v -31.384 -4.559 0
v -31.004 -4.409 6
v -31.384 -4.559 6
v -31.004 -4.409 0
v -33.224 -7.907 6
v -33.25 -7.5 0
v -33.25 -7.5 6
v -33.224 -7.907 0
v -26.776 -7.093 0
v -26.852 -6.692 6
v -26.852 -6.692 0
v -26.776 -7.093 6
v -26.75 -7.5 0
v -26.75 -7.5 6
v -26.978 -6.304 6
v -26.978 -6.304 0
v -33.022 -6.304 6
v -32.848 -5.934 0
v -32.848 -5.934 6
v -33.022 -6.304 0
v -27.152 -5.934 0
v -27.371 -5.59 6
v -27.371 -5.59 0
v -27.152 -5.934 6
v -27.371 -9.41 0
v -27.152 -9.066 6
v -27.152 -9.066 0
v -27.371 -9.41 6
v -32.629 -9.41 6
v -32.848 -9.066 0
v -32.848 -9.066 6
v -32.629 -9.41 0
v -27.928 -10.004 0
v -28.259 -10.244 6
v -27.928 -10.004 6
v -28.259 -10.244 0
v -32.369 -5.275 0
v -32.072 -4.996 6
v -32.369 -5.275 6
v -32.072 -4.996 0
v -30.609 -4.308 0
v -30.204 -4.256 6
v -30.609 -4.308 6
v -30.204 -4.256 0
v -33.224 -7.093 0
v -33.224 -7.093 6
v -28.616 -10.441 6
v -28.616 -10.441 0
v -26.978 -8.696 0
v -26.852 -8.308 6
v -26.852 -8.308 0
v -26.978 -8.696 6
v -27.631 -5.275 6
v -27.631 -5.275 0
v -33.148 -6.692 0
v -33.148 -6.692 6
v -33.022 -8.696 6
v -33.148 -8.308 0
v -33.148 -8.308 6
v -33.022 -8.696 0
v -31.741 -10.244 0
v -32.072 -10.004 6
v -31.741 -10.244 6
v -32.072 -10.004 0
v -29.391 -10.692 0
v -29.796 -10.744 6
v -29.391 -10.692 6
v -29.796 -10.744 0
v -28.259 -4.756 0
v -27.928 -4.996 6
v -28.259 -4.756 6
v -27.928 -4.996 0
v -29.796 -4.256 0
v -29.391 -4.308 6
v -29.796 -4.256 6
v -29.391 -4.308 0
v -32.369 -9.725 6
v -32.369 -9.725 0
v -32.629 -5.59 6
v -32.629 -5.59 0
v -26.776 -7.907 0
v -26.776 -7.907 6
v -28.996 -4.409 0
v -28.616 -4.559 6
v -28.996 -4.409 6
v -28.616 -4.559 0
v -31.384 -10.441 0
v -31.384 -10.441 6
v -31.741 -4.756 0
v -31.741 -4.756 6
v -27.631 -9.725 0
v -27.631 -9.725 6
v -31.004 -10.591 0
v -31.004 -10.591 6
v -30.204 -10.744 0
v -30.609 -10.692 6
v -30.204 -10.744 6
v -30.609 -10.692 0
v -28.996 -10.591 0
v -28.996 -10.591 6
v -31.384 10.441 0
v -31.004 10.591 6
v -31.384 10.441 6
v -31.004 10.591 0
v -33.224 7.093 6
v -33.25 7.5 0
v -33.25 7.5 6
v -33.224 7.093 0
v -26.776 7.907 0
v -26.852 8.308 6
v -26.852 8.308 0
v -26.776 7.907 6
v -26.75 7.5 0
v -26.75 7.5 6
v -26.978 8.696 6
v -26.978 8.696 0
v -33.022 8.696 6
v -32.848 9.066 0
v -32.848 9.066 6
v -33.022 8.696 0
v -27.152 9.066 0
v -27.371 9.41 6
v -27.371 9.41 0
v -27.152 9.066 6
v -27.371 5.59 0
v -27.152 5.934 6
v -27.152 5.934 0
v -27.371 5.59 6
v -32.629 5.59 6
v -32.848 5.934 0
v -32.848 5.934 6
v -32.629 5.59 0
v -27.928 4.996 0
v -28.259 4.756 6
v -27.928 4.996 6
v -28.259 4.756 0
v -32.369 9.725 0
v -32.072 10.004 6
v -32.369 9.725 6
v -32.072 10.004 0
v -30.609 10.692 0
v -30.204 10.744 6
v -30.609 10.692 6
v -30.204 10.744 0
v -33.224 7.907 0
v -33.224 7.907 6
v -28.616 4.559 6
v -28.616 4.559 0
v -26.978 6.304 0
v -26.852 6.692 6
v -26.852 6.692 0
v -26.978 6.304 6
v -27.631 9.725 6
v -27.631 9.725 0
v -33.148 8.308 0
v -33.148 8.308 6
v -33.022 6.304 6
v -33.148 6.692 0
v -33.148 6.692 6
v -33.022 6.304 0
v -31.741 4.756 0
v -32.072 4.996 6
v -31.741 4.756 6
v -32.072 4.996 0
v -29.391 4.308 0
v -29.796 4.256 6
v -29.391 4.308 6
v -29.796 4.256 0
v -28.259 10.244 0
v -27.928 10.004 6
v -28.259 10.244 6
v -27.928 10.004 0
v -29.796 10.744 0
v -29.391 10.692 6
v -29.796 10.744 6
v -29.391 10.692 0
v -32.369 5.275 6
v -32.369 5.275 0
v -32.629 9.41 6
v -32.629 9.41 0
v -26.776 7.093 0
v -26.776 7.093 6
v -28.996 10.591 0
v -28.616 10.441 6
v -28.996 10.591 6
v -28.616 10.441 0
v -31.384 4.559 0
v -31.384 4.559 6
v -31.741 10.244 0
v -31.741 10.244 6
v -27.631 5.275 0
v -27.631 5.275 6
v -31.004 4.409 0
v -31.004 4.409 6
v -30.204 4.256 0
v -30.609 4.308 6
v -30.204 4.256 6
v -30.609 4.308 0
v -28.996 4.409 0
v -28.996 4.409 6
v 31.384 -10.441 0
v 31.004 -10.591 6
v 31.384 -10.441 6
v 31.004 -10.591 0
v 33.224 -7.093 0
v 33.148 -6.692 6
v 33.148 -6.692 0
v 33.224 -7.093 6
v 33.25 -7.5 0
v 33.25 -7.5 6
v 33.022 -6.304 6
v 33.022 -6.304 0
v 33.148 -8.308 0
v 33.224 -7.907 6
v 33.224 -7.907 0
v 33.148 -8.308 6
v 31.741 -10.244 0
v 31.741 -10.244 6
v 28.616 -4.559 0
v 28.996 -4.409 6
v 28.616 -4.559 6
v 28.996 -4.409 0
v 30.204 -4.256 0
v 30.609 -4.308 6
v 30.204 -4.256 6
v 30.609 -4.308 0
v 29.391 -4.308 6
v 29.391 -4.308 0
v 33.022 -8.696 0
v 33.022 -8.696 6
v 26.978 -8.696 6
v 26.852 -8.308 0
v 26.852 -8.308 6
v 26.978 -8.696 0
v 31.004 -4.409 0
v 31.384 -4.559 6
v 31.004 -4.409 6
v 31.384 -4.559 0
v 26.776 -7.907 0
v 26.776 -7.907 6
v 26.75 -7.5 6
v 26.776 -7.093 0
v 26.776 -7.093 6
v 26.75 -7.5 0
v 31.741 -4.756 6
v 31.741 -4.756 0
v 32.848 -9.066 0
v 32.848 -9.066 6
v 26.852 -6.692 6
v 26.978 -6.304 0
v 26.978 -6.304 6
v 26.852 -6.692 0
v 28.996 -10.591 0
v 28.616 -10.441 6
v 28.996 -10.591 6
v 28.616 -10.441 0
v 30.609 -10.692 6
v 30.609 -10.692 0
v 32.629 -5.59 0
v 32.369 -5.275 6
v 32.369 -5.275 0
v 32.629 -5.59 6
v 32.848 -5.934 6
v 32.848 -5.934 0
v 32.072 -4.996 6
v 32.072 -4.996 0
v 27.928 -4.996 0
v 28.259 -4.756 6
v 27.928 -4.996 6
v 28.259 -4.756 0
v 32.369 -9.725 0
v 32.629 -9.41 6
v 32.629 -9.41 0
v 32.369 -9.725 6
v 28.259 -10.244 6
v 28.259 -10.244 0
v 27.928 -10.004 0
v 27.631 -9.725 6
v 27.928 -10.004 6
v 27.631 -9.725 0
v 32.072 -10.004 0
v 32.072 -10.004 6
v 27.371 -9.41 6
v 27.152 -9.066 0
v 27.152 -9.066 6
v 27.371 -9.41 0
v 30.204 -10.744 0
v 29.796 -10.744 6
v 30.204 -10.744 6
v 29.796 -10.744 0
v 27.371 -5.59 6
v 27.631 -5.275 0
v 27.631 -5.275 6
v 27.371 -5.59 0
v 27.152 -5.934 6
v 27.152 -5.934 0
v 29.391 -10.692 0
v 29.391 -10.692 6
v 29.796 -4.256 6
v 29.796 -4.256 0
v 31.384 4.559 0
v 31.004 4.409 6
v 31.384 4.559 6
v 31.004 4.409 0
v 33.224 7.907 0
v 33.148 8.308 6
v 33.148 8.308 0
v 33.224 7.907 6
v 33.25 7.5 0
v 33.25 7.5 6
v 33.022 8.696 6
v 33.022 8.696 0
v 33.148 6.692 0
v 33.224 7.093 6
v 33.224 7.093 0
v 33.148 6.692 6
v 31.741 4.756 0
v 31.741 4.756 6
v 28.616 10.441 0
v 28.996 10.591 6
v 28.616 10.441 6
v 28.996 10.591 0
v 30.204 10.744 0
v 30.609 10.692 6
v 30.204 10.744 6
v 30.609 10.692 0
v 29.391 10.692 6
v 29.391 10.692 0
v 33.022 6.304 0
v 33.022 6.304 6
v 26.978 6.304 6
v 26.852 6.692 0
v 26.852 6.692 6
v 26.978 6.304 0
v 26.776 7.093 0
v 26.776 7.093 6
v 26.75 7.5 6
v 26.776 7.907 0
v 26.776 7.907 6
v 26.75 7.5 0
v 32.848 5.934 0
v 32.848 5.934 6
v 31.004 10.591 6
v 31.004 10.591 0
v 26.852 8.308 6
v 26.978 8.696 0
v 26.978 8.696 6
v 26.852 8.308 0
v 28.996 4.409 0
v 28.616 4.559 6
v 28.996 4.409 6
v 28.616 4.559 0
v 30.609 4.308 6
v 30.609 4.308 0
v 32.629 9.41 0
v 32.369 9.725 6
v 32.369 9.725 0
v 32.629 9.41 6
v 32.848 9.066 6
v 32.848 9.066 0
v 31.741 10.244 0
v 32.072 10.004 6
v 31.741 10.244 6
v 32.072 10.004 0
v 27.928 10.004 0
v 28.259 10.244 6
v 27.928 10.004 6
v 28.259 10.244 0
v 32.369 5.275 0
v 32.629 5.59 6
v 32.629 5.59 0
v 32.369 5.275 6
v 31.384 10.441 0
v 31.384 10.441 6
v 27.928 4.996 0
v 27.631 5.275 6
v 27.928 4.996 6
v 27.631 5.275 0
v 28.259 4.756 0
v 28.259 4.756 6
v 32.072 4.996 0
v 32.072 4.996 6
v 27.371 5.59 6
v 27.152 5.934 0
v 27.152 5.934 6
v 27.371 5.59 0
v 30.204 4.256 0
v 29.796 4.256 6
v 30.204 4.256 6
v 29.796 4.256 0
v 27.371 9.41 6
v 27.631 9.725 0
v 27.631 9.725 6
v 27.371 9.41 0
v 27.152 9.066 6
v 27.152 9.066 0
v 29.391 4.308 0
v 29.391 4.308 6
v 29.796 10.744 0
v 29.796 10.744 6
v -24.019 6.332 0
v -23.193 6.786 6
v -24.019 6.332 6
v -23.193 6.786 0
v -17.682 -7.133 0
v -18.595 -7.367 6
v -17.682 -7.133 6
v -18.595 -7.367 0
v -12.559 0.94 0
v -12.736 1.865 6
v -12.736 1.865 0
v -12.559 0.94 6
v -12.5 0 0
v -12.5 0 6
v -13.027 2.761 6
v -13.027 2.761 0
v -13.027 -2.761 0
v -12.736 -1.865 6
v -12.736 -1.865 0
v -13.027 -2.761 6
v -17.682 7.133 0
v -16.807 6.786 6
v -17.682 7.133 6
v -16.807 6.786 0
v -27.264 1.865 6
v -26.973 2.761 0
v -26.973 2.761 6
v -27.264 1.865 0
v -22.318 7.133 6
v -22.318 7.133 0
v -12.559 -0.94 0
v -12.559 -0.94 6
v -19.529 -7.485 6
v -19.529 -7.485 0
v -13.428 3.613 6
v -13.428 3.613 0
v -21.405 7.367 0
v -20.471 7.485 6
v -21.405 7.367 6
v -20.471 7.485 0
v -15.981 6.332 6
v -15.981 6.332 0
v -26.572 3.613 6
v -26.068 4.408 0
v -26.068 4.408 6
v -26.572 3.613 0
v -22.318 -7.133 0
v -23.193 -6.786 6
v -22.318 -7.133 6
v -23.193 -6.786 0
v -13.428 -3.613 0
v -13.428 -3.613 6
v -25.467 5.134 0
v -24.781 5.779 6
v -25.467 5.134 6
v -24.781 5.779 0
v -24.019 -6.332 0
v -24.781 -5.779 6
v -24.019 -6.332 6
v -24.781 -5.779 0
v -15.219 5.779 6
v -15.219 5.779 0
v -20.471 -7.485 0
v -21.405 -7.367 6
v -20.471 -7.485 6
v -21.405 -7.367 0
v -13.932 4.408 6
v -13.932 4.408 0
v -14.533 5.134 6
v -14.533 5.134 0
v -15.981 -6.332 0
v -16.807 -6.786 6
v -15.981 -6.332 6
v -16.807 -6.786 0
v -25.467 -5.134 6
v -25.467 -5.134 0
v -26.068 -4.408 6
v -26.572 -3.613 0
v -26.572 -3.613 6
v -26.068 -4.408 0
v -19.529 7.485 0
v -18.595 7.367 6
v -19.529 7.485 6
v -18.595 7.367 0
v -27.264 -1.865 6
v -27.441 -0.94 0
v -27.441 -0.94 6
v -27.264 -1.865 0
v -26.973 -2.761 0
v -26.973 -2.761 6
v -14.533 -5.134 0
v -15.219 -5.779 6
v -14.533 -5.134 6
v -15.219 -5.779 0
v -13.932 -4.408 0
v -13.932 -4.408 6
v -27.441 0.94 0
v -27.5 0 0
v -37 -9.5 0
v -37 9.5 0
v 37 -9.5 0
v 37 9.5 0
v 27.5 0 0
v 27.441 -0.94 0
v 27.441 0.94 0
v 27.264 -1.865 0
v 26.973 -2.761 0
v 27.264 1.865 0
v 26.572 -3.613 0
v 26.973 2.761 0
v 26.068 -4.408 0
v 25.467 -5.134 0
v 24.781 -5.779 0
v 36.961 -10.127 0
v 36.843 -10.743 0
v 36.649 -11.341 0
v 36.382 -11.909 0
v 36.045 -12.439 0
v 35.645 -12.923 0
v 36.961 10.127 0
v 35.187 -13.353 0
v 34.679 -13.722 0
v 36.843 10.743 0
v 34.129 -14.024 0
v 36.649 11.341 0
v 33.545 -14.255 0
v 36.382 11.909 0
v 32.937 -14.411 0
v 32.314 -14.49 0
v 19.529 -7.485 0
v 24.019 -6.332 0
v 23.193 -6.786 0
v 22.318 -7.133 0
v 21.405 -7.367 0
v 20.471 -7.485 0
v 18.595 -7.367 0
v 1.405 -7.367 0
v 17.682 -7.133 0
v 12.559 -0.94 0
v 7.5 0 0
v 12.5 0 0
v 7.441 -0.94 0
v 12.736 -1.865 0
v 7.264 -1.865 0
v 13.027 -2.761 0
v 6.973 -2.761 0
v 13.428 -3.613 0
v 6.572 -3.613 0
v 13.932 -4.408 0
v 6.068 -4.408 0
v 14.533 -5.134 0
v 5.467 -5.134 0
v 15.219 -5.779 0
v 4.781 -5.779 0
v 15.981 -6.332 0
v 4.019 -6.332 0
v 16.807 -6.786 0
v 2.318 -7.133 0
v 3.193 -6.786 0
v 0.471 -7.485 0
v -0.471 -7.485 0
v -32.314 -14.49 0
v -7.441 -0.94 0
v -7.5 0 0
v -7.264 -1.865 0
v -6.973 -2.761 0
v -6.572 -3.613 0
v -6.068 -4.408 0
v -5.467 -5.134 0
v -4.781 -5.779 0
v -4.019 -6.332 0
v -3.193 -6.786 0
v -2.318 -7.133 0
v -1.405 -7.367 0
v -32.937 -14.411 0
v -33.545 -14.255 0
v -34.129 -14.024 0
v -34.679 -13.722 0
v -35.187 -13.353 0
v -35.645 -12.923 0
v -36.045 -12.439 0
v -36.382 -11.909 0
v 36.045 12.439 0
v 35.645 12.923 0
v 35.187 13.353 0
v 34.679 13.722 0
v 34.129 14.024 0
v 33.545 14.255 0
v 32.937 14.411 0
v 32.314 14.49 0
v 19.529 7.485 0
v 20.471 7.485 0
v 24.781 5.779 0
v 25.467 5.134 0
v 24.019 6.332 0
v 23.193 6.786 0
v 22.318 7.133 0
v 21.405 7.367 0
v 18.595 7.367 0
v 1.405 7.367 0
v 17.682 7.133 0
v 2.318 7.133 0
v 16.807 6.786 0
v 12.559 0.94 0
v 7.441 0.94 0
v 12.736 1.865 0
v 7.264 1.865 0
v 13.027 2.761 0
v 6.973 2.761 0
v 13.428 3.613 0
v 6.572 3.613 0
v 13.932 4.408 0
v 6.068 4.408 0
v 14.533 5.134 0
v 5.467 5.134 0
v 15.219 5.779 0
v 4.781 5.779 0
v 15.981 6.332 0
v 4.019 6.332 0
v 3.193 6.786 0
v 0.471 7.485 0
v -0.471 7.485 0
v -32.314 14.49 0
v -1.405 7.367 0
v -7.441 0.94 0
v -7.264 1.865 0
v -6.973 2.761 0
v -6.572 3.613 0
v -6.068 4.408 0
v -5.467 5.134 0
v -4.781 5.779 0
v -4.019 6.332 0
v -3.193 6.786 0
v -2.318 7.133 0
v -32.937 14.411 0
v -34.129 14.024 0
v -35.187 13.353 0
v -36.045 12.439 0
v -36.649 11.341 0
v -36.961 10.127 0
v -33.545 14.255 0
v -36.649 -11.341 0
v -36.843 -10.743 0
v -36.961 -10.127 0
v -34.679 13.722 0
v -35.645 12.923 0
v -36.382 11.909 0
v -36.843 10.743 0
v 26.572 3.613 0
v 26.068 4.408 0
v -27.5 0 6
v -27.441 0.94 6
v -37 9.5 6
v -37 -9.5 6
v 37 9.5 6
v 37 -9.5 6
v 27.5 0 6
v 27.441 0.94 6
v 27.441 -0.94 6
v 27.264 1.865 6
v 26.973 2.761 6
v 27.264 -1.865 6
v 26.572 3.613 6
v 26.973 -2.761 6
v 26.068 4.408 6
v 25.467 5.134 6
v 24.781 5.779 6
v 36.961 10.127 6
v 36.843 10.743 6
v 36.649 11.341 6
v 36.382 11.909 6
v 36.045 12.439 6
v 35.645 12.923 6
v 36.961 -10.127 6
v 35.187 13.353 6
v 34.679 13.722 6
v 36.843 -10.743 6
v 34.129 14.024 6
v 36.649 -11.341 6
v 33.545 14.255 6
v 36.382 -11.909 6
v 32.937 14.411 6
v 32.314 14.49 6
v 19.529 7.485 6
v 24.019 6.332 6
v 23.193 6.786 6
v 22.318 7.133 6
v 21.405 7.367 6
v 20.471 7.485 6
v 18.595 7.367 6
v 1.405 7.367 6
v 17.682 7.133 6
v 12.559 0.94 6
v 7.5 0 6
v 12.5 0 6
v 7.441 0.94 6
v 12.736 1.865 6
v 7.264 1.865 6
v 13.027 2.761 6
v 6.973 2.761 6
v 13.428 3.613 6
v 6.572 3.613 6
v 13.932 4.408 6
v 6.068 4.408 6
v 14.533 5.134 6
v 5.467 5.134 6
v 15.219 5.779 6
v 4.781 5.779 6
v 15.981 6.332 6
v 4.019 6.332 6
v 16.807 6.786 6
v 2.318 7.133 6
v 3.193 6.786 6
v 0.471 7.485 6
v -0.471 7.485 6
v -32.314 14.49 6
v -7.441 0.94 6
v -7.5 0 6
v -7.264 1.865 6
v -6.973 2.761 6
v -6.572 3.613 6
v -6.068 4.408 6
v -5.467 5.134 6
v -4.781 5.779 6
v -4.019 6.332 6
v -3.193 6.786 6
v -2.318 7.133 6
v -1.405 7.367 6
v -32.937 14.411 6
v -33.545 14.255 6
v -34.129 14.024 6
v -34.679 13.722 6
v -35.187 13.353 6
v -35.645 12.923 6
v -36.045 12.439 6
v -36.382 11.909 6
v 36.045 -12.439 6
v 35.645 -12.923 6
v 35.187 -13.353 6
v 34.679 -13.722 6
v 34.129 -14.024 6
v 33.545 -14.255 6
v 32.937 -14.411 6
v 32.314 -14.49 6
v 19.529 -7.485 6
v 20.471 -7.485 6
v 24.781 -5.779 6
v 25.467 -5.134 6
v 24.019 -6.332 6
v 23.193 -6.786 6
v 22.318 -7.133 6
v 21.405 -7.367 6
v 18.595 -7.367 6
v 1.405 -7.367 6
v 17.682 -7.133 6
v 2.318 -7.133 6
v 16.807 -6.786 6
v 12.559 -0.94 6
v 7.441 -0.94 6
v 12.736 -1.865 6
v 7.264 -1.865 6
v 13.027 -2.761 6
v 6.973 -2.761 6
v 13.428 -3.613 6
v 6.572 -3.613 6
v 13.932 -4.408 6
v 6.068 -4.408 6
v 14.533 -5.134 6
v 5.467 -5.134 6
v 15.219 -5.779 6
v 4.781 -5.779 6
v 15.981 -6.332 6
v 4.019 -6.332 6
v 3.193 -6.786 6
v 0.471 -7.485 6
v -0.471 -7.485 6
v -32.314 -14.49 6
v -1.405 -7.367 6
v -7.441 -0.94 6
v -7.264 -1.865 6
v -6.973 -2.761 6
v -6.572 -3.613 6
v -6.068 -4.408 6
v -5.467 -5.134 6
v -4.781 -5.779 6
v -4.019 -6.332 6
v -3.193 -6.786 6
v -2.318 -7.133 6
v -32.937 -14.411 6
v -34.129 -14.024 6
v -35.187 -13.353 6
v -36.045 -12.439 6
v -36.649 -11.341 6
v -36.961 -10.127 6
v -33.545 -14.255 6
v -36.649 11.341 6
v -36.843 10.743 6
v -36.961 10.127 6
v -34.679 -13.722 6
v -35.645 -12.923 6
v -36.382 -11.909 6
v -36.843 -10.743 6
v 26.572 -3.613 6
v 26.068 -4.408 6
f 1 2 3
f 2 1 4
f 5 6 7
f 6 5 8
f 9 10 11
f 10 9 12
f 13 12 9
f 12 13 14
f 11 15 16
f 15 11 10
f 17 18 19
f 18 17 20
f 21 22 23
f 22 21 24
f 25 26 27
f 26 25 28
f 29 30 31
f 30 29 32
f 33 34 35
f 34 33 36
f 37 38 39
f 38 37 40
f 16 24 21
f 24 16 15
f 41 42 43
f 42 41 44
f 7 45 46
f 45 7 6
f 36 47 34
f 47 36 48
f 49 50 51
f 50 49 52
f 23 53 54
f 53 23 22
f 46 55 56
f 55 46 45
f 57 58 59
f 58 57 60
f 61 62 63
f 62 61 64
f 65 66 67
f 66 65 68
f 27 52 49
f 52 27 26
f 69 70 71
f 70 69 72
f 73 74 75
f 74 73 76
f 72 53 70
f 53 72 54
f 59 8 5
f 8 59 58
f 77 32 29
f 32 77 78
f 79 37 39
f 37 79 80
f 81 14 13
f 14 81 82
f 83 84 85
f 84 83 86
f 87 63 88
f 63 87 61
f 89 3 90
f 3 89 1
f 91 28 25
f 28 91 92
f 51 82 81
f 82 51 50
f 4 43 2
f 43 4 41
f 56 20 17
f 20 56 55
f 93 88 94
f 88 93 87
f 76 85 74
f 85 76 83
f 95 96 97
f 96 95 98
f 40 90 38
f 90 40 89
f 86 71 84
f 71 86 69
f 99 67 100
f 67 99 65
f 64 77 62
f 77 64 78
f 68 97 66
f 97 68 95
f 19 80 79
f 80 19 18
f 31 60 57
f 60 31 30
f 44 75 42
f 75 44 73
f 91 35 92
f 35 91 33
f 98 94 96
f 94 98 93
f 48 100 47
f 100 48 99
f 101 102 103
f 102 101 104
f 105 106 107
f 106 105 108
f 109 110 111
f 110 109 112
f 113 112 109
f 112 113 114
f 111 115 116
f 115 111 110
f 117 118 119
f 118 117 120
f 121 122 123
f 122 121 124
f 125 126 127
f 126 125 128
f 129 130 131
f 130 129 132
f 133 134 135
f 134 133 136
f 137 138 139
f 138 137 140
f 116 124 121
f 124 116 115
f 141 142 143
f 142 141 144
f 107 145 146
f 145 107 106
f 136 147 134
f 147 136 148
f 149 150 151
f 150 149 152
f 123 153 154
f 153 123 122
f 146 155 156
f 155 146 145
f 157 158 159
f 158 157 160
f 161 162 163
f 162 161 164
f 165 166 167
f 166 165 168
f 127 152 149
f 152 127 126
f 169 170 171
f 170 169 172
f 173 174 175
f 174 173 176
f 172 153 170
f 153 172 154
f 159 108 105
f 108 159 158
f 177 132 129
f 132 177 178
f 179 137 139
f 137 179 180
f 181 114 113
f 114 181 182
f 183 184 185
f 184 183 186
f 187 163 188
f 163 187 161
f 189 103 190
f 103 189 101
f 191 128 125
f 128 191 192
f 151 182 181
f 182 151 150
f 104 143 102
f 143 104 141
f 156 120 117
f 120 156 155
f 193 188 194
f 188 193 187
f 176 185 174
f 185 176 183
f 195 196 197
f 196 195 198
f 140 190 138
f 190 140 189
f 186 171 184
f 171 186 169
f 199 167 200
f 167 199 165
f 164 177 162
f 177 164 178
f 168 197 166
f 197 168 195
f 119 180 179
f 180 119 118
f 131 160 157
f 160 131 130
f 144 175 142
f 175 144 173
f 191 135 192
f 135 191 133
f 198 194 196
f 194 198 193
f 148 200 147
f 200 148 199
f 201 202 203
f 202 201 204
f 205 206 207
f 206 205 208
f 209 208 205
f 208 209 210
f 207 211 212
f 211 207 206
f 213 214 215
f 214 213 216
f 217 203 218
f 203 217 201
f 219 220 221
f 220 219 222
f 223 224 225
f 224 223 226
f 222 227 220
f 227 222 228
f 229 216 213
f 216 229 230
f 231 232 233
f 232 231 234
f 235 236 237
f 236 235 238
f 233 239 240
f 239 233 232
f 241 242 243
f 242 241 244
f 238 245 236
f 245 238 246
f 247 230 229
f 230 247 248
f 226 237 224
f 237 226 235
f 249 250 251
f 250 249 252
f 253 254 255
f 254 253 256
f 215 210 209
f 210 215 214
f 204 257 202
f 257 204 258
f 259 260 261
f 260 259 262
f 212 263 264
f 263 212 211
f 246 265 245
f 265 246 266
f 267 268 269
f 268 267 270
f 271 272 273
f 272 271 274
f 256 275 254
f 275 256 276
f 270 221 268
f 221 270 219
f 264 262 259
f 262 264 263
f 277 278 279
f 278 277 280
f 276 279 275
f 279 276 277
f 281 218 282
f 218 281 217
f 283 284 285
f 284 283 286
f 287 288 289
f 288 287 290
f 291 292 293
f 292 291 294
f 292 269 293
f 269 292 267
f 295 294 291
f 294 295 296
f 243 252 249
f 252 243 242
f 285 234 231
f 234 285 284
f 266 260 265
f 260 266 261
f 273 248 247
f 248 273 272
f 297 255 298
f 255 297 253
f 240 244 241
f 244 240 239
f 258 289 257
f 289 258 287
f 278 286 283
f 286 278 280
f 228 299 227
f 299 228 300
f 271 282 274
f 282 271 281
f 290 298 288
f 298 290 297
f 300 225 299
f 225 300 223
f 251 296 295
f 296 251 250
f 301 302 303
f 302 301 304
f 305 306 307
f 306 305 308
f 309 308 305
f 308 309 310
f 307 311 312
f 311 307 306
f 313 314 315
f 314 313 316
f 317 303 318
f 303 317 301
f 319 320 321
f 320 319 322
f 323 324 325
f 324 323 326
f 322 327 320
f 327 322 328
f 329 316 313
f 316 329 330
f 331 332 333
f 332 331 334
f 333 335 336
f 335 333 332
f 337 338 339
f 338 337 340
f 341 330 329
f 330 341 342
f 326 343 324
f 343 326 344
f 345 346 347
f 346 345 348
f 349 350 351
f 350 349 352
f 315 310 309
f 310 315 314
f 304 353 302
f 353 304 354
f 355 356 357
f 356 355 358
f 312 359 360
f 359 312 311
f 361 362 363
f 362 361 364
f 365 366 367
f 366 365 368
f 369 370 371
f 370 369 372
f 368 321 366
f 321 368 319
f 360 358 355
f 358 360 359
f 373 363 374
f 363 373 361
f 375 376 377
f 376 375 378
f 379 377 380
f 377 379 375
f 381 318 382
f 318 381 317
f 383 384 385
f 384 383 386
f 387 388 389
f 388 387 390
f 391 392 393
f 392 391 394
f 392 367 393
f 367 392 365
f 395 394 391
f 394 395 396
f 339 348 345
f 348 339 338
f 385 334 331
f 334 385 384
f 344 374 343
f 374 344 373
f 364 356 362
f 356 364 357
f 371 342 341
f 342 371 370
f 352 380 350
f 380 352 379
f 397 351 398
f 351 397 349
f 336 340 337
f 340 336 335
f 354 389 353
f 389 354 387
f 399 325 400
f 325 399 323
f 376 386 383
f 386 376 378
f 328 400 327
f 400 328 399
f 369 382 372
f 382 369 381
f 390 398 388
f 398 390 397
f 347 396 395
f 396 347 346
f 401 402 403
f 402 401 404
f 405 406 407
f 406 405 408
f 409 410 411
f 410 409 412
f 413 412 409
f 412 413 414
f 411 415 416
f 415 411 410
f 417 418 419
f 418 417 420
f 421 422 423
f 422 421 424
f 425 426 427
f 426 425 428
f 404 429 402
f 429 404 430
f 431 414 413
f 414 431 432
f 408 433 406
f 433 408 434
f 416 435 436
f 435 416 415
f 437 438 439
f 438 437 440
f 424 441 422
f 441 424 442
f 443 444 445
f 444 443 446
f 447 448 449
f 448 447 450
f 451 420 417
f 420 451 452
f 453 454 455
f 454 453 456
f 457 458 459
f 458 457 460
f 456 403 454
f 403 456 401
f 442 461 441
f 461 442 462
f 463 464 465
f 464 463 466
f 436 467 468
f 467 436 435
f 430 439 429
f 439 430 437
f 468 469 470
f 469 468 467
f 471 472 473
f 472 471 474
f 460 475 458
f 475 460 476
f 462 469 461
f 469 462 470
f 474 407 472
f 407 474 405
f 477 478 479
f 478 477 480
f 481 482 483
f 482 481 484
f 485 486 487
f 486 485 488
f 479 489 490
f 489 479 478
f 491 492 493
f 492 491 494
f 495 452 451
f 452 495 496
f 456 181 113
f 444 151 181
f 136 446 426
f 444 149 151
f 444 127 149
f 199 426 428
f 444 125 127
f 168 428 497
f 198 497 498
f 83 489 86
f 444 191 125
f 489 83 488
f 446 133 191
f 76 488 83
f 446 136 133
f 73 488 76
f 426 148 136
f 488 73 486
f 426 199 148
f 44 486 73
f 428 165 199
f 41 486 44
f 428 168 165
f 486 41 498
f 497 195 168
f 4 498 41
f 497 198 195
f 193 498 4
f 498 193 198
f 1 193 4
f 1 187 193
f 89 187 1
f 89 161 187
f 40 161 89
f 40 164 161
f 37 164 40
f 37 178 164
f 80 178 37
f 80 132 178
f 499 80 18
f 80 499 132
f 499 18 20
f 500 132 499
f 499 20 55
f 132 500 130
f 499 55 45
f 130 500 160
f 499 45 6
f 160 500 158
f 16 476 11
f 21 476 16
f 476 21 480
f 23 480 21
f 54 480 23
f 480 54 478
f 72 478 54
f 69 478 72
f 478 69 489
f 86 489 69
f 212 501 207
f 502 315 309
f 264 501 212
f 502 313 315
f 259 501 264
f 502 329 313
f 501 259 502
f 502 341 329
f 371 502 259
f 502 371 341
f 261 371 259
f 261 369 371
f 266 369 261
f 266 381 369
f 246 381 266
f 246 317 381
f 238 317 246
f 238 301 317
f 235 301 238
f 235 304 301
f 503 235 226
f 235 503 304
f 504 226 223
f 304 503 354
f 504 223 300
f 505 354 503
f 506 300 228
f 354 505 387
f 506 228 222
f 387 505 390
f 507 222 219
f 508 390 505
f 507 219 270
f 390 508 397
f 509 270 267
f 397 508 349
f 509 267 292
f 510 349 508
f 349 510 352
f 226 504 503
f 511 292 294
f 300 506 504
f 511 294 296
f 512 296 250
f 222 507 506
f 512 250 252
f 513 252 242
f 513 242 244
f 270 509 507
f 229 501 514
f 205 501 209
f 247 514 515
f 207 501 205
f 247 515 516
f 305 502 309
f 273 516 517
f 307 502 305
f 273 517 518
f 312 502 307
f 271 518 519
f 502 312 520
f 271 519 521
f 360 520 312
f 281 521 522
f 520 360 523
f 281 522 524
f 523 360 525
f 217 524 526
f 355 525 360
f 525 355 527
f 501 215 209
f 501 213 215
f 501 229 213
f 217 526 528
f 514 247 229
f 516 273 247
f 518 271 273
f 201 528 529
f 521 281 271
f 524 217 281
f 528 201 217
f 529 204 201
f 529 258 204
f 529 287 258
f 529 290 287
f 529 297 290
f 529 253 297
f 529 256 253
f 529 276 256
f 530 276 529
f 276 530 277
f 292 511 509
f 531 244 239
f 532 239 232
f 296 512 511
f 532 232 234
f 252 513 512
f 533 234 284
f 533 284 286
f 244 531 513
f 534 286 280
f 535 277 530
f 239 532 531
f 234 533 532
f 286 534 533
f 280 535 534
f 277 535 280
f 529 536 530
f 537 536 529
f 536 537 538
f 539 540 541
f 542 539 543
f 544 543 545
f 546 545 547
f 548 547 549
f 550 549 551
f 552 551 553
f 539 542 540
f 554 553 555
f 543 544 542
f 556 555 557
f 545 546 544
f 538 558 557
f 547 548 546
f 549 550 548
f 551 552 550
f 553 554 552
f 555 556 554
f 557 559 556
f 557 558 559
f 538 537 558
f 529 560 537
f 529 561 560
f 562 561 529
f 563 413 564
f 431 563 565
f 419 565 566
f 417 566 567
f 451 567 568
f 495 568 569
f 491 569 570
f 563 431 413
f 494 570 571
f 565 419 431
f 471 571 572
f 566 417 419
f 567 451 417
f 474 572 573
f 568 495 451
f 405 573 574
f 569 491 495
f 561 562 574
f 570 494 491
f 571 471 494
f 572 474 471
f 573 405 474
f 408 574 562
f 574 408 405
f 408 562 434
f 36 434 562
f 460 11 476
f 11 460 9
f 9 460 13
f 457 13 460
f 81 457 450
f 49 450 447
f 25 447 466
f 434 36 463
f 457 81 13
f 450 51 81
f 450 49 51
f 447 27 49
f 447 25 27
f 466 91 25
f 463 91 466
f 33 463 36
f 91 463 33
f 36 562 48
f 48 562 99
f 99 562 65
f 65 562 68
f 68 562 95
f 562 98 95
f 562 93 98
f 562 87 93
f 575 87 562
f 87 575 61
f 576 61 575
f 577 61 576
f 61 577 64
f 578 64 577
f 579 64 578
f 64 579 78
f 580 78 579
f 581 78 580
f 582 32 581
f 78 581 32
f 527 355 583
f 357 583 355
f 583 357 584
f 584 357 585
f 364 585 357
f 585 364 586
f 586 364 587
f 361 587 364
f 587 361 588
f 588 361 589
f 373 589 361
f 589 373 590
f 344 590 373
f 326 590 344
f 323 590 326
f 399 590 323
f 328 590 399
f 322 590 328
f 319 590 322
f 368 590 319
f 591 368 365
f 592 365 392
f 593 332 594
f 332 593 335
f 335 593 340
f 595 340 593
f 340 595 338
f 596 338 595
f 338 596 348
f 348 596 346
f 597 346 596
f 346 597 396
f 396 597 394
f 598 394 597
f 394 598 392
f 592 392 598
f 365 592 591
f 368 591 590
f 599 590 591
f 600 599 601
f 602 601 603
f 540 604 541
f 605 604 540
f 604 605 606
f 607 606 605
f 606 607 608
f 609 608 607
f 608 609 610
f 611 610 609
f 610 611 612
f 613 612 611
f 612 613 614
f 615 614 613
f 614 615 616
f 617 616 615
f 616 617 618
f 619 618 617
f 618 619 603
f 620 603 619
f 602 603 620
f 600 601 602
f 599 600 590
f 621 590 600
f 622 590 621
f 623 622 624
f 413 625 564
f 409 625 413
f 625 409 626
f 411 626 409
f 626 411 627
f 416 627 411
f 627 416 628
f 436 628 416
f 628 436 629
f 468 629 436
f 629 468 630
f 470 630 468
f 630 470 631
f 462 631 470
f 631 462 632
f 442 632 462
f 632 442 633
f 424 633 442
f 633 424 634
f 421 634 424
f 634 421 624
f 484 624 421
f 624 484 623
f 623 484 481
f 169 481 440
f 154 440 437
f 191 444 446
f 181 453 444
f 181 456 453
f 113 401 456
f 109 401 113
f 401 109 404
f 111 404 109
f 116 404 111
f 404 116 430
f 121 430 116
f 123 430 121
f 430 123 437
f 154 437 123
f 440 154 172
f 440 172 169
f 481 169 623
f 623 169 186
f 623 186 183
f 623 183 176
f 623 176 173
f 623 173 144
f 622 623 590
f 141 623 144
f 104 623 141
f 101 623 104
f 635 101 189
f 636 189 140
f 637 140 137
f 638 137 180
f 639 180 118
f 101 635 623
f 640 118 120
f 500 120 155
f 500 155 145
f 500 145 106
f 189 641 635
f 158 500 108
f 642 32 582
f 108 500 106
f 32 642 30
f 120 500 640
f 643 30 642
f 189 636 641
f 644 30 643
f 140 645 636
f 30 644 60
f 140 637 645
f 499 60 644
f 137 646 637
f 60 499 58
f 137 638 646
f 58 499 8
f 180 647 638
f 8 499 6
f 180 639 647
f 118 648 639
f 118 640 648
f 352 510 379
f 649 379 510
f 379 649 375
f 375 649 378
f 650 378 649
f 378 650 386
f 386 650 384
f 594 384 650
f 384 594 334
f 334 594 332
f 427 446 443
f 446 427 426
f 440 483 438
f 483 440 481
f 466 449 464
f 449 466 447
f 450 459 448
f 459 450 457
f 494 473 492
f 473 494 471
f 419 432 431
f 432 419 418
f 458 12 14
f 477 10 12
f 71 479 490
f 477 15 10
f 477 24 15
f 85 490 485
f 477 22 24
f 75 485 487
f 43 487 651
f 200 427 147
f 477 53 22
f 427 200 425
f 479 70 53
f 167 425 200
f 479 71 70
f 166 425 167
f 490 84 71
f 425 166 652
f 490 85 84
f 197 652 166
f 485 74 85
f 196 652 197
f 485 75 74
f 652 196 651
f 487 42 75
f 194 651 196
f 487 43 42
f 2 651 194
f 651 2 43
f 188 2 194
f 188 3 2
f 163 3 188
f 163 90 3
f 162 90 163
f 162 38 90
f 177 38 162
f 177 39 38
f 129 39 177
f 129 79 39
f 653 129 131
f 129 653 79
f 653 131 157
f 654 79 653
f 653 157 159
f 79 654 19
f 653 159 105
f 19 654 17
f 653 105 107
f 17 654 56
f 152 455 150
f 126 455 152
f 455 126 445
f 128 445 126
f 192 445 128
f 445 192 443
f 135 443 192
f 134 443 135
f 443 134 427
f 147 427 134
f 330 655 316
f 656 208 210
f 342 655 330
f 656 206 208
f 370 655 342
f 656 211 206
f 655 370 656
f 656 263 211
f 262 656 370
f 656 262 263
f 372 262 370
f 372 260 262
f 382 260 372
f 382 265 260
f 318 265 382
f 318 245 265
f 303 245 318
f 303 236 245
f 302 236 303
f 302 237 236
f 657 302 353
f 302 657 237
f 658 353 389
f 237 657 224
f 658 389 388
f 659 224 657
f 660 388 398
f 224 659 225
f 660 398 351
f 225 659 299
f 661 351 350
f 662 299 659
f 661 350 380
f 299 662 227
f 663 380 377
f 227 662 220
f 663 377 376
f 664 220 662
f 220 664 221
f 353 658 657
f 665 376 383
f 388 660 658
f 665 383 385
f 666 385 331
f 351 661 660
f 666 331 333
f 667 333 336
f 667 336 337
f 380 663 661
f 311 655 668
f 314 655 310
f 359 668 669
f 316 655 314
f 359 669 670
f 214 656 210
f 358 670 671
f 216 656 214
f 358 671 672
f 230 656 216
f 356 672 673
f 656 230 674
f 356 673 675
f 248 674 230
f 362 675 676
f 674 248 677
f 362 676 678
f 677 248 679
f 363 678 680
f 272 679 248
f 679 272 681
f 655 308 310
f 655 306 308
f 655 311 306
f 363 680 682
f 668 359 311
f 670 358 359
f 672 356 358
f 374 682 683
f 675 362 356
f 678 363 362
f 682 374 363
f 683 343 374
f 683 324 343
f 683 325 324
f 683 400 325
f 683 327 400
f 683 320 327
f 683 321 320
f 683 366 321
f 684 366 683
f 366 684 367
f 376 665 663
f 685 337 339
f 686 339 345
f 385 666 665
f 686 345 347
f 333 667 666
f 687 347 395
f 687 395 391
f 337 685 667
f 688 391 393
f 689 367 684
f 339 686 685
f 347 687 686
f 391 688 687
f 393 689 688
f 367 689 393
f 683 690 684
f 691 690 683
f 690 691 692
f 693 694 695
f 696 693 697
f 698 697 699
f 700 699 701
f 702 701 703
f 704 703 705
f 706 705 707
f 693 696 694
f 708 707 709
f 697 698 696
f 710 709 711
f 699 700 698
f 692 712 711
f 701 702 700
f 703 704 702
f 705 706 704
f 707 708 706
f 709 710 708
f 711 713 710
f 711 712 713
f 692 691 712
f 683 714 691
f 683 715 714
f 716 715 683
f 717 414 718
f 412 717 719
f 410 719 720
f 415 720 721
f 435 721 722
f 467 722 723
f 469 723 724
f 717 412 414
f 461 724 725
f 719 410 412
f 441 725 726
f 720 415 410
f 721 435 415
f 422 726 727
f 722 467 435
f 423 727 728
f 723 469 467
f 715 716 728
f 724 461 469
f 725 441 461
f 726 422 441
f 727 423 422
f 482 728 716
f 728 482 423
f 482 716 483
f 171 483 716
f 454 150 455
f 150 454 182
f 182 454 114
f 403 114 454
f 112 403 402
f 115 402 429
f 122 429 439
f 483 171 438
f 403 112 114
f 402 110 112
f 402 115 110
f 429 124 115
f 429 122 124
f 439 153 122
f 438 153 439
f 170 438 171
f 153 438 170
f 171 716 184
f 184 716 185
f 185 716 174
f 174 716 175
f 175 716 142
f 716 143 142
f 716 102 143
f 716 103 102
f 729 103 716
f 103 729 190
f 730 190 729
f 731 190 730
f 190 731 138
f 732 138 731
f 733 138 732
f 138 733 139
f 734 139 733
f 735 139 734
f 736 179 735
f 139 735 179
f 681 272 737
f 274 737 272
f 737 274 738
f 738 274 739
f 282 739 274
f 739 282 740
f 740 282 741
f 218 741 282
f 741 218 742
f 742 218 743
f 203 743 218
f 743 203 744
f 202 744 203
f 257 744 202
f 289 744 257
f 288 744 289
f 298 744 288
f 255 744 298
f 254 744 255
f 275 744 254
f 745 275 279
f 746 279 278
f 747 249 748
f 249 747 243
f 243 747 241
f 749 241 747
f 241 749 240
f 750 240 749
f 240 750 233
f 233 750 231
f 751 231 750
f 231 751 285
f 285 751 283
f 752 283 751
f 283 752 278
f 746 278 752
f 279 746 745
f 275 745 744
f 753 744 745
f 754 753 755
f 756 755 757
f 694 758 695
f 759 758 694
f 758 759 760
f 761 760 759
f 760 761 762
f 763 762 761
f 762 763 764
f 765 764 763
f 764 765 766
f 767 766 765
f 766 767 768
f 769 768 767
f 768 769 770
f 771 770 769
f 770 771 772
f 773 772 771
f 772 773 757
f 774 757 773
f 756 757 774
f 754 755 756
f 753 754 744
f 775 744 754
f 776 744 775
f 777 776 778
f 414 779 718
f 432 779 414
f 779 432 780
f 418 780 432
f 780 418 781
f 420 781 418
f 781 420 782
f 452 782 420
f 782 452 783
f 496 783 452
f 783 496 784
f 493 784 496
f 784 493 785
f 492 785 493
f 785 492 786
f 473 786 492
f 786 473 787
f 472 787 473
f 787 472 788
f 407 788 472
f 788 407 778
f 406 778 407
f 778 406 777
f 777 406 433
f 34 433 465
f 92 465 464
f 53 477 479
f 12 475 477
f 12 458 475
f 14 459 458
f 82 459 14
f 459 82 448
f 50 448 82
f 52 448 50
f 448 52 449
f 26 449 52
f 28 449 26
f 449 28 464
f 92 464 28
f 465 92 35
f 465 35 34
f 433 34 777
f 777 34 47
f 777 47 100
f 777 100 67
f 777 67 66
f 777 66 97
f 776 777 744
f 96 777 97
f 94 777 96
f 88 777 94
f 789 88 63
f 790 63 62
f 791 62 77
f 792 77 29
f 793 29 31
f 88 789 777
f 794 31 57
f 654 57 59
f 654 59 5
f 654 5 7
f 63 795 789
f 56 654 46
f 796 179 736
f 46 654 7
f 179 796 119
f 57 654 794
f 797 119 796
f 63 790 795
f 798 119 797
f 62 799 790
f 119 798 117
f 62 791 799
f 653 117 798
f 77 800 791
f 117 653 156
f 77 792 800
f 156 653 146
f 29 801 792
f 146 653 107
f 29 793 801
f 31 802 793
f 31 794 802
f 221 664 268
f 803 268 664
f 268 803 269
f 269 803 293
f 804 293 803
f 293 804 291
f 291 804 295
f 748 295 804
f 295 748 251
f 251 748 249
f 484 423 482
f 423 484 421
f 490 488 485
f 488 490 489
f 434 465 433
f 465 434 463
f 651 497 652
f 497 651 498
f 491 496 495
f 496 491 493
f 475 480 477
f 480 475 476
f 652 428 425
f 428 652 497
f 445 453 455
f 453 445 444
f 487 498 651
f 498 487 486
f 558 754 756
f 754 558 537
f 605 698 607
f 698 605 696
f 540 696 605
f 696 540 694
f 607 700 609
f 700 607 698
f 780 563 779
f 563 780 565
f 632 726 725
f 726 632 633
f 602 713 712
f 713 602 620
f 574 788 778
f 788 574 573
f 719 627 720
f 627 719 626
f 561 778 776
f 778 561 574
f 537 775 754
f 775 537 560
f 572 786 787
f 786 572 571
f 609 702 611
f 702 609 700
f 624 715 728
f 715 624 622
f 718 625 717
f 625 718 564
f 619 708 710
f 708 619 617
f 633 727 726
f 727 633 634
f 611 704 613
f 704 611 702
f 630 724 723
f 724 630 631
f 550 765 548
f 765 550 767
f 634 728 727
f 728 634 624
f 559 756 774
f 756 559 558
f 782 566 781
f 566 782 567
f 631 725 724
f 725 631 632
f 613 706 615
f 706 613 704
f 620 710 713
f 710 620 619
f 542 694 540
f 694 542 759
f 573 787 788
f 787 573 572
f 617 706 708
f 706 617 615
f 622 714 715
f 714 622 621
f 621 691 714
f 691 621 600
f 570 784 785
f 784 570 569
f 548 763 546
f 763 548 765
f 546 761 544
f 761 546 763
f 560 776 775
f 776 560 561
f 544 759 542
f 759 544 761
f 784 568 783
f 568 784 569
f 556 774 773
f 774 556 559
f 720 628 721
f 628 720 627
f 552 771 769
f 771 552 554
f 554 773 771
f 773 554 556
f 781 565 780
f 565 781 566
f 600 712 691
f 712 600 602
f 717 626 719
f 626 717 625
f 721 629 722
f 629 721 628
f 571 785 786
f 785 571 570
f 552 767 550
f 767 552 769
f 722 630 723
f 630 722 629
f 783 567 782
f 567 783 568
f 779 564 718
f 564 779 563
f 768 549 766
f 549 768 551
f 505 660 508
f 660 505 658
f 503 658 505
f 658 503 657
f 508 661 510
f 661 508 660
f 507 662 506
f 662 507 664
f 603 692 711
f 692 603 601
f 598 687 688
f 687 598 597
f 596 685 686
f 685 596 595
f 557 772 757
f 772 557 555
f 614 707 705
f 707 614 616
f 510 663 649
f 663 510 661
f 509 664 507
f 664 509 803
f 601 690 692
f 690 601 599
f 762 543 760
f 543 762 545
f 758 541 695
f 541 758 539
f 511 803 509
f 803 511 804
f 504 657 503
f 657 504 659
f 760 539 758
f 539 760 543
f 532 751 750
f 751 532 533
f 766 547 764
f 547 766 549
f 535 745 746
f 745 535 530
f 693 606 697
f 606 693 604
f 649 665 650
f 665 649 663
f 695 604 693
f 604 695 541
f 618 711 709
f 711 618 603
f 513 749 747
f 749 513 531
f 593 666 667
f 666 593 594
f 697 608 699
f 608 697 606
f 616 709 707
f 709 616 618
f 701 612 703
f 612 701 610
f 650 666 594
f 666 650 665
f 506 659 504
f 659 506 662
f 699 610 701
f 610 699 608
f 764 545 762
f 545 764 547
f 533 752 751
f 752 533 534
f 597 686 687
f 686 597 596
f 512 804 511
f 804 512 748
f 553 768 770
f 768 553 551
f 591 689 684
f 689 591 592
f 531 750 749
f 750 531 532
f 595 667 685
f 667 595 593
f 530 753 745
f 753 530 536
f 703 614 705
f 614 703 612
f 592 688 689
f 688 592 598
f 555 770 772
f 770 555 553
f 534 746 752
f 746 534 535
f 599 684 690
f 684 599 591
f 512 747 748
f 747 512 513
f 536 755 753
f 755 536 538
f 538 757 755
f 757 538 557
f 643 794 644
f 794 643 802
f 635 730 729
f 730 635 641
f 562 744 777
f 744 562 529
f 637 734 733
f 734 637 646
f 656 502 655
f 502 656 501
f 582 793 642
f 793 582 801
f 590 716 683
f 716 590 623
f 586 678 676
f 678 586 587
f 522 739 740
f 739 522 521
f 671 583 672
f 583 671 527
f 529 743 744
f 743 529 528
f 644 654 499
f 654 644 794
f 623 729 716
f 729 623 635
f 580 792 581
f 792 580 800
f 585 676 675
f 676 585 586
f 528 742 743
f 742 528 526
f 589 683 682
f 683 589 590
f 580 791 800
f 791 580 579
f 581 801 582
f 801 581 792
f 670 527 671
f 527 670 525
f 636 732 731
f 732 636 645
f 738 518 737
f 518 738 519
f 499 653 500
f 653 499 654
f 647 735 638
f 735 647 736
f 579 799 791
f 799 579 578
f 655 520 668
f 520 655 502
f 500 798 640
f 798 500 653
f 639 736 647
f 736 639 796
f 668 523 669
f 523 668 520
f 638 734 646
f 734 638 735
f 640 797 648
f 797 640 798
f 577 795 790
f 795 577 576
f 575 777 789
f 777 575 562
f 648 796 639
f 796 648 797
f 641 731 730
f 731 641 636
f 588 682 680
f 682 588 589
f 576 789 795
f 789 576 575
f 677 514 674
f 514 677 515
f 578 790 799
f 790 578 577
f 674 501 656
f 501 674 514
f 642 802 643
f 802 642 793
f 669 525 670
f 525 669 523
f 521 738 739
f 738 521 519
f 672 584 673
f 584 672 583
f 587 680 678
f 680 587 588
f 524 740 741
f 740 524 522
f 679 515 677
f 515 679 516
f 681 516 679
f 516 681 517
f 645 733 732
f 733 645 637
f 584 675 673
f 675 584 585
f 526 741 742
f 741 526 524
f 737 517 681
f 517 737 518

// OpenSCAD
$fn = 50;


difference() {
	union() {
		hull() {
			translate(v = [-32.0000000000, 9.5000000000, 0]) {
				cylinder(h = 6, r = 5);
			}
			translate(v = [32.0000000000, 9.5000000000, 0]) {
				cylinder(h = 6, r = 5);
			}
			translate(v = [-32.0000000000, -9.5000000000, 0]) {
				cylinder(h = 6, r = 5);
			}
			translate(v = [32.0000000000, -9.5000000000, 0]) {
				cylinder(h = 6, r = 5);
			}
		}
	}
	union() {
		#translate(v = [-30.0000000000, -7.5000000000, -100.0000000000]) {
			cylinder(h = 200, r = 3.2500000000);
		}
		#translate(v = [-30.0000000000, 7.5000000000, -100.0000000000]) {
			cylinder(h = 200, r = 3.2500000000);
		}
		#translate(v = [30.0000000000, -7.5000000000, -100.0000000000]) {
			cylinder(h = 200, r = 3.2500000000);
		}
		#translate(v = [30.0000000000, 7.5000000000, -100.0000000000]) {
			cylinder(h = 200, r = 3.2500000000);
		}
		#translate(v = [-20.0000000000, 0, 0]) {
			cylinder(h = 6, r = 7.5000000000);
		}
		#cylinder(h = 6, r = 7.5000000000);
		#translate(v = [20.0000000000, 0, 0]) {
			cylinder(h = 6, r = 7.5000000000);
		}
	}
}
